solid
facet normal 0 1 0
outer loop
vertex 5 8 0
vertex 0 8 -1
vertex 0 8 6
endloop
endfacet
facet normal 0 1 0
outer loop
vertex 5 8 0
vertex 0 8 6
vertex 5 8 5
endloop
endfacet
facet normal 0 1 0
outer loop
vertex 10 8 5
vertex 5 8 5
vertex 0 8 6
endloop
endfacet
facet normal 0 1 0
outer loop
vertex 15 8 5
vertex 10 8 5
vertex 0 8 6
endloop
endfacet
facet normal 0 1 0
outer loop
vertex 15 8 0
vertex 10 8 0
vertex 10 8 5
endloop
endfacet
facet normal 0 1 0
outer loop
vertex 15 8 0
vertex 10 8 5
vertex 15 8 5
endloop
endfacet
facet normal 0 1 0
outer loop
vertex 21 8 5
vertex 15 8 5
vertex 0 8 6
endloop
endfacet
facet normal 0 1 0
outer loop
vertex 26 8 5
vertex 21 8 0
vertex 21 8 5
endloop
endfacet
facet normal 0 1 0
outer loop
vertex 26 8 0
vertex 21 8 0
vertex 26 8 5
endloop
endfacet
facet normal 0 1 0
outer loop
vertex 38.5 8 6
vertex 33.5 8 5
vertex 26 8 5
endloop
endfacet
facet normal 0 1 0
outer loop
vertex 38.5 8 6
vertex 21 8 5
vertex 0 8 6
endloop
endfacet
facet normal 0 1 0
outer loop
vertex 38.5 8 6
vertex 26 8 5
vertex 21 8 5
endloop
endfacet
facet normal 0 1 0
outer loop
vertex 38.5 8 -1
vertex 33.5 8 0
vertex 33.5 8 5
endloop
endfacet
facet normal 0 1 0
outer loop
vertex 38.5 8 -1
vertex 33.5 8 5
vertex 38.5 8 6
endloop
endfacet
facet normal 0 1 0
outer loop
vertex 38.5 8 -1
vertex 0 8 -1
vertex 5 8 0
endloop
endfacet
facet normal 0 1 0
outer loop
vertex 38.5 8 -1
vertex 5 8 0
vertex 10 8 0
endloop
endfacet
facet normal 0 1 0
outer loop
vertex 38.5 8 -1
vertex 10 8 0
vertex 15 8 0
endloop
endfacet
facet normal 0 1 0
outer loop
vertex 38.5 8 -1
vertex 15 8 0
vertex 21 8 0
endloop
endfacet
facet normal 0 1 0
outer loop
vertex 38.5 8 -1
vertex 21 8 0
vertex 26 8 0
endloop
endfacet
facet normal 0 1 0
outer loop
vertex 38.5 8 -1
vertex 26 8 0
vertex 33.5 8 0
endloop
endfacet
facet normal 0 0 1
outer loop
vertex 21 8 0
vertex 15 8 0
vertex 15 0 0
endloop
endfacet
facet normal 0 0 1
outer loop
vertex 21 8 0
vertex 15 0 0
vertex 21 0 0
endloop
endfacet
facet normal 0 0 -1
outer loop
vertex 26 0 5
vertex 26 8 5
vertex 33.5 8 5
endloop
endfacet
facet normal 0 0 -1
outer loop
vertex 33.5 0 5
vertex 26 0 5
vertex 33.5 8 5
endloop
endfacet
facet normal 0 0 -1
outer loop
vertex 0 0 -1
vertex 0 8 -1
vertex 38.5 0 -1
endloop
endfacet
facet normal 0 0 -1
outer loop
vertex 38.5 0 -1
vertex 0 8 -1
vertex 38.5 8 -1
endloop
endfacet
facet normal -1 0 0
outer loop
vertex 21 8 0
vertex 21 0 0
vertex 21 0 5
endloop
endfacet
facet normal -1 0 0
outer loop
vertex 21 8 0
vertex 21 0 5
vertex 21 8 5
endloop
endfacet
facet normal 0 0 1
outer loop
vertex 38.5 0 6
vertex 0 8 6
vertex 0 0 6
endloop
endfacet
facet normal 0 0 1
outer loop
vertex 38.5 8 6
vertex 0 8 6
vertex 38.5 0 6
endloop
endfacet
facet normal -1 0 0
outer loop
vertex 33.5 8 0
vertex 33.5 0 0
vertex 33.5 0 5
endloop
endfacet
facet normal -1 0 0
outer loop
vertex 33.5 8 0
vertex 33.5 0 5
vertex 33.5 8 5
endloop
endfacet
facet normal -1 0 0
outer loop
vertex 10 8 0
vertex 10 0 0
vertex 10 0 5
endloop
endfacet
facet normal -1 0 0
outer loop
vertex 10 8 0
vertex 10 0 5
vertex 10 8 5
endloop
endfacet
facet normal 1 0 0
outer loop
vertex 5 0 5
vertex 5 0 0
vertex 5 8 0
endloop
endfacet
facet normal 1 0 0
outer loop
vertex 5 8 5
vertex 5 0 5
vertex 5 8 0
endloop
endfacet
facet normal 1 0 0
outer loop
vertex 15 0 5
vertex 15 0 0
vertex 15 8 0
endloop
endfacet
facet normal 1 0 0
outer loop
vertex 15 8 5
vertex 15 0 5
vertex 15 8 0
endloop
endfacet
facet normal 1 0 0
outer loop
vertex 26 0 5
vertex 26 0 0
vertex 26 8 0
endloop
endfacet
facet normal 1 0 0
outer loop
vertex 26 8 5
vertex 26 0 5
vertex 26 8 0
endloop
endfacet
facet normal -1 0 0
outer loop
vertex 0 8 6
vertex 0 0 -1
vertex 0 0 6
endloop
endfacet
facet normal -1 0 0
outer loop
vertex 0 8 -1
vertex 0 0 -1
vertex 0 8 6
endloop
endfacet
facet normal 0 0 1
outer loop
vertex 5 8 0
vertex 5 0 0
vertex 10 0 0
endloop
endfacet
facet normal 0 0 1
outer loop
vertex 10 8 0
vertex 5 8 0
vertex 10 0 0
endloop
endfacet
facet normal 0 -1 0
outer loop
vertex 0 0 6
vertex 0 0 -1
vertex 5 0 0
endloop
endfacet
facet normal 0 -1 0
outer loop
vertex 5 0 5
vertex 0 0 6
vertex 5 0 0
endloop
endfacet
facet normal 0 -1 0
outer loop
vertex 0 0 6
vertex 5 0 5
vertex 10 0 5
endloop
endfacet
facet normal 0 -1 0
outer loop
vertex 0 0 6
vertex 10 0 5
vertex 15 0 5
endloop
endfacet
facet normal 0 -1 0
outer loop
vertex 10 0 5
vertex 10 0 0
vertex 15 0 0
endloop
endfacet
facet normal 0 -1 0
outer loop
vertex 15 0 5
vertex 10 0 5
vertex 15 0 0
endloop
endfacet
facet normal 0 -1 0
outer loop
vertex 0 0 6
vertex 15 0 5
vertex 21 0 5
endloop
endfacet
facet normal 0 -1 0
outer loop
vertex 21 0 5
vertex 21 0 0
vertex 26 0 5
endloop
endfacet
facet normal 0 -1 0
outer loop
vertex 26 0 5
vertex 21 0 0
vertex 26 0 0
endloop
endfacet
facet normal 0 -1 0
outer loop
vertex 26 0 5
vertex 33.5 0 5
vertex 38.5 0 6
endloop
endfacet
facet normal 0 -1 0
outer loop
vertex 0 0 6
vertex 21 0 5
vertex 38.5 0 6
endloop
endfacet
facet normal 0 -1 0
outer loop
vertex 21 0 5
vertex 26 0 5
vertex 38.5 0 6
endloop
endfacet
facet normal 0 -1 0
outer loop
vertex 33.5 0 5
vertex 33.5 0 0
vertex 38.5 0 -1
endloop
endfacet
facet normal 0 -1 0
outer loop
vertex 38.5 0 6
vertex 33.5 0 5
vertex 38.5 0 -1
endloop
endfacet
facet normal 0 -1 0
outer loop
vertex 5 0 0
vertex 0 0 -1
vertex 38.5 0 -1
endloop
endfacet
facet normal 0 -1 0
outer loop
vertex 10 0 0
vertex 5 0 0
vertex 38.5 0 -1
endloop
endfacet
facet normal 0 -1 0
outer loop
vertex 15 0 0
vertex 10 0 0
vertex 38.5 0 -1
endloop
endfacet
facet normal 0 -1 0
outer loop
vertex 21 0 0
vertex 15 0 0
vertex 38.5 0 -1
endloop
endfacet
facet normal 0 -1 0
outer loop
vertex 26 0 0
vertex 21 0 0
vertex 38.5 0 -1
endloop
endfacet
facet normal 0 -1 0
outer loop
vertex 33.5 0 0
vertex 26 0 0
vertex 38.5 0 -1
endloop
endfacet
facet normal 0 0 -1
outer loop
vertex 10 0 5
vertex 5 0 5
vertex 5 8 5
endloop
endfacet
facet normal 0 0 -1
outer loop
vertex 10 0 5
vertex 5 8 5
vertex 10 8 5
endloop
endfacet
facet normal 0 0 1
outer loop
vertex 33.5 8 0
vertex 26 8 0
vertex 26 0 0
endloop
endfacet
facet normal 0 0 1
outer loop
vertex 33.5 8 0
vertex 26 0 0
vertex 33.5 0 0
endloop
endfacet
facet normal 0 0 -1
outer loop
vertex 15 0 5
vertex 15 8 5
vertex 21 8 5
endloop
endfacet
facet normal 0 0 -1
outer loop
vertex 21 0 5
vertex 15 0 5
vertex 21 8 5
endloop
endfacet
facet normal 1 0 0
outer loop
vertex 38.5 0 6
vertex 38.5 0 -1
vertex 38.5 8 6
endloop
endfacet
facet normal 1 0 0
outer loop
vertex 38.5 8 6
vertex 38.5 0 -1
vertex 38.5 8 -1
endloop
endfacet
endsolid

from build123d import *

# Parameters (mm, degrees)
F0_W     = 5
F0_H     = 8
F1_DEPTH = 5
F2_W     = 38.5
F2_H     = 8
F3_DEPTH = 1
F4_W     = 38.5
F4_H     = 8
F5_DEPTH = 1


with BuildPart() as f1:
    # F0 (on Top) → F1 (new body)
    with BuildSketch(Plane.XY):
        with Locations((2.5, 4)):
            Rectangle(F0_W, F0_H)
        with Locations((12.5, 4)):
            Rectangle(F0_W, F0_H)
        with Locations((23.5, 4)):
            Rectangle(F0_W, F0_H)
        with Locations((36, 4)):
            Rectangle(F0_W, F0_H)
    extrude(amount=F1_DEPTH)

    # F2 (on Top) → F3 (join)
    with BuildSketch(Plane.XY):
        with Locations((19.25, 4)):
            Rectangle(F2_W, F2_H)
    extrude(amount=-F3_DEPTH)

    # F4 (on face) → F5 (join)
    with BuildSketch(Plane.XY.offset(5)):
        with Locations((19.25, 4)):
            Rectangle(F4_W, F4_H)
    extrude(amount=F5_DEPTH)


solid = f1.part
